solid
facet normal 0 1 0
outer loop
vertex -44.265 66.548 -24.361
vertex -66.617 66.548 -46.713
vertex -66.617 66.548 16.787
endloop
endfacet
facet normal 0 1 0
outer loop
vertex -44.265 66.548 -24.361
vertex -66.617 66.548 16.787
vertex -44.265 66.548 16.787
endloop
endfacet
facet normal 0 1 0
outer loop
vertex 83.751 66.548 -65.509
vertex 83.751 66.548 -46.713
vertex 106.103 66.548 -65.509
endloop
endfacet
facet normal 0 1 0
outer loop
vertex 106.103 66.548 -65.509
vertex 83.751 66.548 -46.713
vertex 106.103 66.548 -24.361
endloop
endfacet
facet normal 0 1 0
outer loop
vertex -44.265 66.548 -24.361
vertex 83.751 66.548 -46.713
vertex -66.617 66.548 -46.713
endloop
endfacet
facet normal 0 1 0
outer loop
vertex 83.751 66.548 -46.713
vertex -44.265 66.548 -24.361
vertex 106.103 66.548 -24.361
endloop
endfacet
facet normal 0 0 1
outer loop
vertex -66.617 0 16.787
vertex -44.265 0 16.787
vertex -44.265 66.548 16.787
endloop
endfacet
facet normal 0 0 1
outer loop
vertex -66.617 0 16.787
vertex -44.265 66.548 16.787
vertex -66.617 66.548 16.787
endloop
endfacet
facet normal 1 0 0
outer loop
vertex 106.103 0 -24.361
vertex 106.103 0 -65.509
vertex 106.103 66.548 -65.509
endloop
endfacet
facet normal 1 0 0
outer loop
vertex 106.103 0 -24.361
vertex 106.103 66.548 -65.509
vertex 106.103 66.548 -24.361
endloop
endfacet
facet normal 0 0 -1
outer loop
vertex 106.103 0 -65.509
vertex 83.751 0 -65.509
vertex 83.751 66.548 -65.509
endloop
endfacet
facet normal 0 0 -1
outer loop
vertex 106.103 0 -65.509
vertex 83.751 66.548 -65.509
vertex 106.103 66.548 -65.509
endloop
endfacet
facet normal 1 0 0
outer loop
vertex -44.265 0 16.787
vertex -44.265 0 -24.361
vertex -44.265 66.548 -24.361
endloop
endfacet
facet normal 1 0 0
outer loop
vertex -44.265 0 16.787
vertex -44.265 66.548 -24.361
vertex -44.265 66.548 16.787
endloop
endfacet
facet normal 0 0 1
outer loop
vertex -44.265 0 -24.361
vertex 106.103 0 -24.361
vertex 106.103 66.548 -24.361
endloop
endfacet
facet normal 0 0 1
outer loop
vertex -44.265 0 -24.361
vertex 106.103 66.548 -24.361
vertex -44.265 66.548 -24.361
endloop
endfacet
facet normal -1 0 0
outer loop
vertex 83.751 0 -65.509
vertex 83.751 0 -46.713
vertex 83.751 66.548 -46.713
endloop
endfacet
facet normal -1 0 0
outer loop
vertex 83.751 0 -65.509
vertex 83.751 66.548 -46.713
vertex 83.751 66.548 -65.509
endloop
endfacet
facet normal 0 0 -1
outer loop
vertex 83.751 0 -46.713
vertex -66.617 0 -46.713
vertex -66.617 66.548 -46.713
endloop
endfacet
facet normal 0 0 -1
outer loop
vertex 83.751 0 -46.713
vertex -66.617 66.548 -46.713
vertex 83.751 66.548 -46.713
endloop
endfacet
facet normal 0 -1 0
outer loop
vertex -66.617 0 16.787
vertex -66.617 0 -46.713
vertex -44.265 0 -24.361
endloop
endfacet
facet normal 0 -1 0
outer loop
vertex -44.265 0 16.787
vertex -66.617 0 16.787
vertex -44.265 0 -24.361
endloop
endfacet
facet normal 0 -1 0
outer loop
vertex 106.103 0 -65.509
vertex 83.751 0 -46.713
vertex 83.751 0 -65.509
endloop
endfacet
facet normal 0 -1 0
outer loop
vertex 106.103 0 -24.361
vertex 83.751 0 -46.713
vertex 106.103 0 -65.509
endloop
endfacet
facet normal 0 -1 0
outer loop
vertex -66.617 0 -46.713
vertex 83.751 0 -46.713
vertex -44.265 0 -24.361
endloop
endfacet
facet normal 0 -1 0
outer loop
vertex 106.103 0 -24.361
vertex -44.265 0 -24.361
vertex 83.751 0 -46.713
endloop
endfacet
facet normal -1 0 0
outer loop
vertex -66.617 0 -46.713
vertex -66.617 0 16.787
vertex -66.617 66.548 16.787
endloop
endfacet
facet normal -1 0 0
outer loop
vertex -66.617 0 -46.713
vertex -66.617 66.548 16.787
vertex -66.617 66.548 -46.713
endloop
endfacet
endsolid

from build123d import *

# Parameters (mm, degrees)
F0_W     = 128.016
F0_H     = 22.352
F1_DEPTH = 66.548


with BuildPart() as f1:
    # F0 (on Front) → F1 (new body)
    with BuildSketch(Plane.XZ):
        Polygon((-44.265021, 16.786693), (-66.617021, 16.786693), (-66.617021, -46.713307), (-44.265021, -46.713307), (-44.265021, -24.361307), align=None)
        with Locations((19.742979, -35.537307)):
            Rectangle(F0_W, F0_H)
        Polygon((106.102979, -24.361307), (83.750979, -24.361307), (83.750979, -46.713307), (83.750979, -65.509307), (106.102979, -65.509307), align=None)
    extrude(amount=-F1_DEPTH)


solid = f1.part
